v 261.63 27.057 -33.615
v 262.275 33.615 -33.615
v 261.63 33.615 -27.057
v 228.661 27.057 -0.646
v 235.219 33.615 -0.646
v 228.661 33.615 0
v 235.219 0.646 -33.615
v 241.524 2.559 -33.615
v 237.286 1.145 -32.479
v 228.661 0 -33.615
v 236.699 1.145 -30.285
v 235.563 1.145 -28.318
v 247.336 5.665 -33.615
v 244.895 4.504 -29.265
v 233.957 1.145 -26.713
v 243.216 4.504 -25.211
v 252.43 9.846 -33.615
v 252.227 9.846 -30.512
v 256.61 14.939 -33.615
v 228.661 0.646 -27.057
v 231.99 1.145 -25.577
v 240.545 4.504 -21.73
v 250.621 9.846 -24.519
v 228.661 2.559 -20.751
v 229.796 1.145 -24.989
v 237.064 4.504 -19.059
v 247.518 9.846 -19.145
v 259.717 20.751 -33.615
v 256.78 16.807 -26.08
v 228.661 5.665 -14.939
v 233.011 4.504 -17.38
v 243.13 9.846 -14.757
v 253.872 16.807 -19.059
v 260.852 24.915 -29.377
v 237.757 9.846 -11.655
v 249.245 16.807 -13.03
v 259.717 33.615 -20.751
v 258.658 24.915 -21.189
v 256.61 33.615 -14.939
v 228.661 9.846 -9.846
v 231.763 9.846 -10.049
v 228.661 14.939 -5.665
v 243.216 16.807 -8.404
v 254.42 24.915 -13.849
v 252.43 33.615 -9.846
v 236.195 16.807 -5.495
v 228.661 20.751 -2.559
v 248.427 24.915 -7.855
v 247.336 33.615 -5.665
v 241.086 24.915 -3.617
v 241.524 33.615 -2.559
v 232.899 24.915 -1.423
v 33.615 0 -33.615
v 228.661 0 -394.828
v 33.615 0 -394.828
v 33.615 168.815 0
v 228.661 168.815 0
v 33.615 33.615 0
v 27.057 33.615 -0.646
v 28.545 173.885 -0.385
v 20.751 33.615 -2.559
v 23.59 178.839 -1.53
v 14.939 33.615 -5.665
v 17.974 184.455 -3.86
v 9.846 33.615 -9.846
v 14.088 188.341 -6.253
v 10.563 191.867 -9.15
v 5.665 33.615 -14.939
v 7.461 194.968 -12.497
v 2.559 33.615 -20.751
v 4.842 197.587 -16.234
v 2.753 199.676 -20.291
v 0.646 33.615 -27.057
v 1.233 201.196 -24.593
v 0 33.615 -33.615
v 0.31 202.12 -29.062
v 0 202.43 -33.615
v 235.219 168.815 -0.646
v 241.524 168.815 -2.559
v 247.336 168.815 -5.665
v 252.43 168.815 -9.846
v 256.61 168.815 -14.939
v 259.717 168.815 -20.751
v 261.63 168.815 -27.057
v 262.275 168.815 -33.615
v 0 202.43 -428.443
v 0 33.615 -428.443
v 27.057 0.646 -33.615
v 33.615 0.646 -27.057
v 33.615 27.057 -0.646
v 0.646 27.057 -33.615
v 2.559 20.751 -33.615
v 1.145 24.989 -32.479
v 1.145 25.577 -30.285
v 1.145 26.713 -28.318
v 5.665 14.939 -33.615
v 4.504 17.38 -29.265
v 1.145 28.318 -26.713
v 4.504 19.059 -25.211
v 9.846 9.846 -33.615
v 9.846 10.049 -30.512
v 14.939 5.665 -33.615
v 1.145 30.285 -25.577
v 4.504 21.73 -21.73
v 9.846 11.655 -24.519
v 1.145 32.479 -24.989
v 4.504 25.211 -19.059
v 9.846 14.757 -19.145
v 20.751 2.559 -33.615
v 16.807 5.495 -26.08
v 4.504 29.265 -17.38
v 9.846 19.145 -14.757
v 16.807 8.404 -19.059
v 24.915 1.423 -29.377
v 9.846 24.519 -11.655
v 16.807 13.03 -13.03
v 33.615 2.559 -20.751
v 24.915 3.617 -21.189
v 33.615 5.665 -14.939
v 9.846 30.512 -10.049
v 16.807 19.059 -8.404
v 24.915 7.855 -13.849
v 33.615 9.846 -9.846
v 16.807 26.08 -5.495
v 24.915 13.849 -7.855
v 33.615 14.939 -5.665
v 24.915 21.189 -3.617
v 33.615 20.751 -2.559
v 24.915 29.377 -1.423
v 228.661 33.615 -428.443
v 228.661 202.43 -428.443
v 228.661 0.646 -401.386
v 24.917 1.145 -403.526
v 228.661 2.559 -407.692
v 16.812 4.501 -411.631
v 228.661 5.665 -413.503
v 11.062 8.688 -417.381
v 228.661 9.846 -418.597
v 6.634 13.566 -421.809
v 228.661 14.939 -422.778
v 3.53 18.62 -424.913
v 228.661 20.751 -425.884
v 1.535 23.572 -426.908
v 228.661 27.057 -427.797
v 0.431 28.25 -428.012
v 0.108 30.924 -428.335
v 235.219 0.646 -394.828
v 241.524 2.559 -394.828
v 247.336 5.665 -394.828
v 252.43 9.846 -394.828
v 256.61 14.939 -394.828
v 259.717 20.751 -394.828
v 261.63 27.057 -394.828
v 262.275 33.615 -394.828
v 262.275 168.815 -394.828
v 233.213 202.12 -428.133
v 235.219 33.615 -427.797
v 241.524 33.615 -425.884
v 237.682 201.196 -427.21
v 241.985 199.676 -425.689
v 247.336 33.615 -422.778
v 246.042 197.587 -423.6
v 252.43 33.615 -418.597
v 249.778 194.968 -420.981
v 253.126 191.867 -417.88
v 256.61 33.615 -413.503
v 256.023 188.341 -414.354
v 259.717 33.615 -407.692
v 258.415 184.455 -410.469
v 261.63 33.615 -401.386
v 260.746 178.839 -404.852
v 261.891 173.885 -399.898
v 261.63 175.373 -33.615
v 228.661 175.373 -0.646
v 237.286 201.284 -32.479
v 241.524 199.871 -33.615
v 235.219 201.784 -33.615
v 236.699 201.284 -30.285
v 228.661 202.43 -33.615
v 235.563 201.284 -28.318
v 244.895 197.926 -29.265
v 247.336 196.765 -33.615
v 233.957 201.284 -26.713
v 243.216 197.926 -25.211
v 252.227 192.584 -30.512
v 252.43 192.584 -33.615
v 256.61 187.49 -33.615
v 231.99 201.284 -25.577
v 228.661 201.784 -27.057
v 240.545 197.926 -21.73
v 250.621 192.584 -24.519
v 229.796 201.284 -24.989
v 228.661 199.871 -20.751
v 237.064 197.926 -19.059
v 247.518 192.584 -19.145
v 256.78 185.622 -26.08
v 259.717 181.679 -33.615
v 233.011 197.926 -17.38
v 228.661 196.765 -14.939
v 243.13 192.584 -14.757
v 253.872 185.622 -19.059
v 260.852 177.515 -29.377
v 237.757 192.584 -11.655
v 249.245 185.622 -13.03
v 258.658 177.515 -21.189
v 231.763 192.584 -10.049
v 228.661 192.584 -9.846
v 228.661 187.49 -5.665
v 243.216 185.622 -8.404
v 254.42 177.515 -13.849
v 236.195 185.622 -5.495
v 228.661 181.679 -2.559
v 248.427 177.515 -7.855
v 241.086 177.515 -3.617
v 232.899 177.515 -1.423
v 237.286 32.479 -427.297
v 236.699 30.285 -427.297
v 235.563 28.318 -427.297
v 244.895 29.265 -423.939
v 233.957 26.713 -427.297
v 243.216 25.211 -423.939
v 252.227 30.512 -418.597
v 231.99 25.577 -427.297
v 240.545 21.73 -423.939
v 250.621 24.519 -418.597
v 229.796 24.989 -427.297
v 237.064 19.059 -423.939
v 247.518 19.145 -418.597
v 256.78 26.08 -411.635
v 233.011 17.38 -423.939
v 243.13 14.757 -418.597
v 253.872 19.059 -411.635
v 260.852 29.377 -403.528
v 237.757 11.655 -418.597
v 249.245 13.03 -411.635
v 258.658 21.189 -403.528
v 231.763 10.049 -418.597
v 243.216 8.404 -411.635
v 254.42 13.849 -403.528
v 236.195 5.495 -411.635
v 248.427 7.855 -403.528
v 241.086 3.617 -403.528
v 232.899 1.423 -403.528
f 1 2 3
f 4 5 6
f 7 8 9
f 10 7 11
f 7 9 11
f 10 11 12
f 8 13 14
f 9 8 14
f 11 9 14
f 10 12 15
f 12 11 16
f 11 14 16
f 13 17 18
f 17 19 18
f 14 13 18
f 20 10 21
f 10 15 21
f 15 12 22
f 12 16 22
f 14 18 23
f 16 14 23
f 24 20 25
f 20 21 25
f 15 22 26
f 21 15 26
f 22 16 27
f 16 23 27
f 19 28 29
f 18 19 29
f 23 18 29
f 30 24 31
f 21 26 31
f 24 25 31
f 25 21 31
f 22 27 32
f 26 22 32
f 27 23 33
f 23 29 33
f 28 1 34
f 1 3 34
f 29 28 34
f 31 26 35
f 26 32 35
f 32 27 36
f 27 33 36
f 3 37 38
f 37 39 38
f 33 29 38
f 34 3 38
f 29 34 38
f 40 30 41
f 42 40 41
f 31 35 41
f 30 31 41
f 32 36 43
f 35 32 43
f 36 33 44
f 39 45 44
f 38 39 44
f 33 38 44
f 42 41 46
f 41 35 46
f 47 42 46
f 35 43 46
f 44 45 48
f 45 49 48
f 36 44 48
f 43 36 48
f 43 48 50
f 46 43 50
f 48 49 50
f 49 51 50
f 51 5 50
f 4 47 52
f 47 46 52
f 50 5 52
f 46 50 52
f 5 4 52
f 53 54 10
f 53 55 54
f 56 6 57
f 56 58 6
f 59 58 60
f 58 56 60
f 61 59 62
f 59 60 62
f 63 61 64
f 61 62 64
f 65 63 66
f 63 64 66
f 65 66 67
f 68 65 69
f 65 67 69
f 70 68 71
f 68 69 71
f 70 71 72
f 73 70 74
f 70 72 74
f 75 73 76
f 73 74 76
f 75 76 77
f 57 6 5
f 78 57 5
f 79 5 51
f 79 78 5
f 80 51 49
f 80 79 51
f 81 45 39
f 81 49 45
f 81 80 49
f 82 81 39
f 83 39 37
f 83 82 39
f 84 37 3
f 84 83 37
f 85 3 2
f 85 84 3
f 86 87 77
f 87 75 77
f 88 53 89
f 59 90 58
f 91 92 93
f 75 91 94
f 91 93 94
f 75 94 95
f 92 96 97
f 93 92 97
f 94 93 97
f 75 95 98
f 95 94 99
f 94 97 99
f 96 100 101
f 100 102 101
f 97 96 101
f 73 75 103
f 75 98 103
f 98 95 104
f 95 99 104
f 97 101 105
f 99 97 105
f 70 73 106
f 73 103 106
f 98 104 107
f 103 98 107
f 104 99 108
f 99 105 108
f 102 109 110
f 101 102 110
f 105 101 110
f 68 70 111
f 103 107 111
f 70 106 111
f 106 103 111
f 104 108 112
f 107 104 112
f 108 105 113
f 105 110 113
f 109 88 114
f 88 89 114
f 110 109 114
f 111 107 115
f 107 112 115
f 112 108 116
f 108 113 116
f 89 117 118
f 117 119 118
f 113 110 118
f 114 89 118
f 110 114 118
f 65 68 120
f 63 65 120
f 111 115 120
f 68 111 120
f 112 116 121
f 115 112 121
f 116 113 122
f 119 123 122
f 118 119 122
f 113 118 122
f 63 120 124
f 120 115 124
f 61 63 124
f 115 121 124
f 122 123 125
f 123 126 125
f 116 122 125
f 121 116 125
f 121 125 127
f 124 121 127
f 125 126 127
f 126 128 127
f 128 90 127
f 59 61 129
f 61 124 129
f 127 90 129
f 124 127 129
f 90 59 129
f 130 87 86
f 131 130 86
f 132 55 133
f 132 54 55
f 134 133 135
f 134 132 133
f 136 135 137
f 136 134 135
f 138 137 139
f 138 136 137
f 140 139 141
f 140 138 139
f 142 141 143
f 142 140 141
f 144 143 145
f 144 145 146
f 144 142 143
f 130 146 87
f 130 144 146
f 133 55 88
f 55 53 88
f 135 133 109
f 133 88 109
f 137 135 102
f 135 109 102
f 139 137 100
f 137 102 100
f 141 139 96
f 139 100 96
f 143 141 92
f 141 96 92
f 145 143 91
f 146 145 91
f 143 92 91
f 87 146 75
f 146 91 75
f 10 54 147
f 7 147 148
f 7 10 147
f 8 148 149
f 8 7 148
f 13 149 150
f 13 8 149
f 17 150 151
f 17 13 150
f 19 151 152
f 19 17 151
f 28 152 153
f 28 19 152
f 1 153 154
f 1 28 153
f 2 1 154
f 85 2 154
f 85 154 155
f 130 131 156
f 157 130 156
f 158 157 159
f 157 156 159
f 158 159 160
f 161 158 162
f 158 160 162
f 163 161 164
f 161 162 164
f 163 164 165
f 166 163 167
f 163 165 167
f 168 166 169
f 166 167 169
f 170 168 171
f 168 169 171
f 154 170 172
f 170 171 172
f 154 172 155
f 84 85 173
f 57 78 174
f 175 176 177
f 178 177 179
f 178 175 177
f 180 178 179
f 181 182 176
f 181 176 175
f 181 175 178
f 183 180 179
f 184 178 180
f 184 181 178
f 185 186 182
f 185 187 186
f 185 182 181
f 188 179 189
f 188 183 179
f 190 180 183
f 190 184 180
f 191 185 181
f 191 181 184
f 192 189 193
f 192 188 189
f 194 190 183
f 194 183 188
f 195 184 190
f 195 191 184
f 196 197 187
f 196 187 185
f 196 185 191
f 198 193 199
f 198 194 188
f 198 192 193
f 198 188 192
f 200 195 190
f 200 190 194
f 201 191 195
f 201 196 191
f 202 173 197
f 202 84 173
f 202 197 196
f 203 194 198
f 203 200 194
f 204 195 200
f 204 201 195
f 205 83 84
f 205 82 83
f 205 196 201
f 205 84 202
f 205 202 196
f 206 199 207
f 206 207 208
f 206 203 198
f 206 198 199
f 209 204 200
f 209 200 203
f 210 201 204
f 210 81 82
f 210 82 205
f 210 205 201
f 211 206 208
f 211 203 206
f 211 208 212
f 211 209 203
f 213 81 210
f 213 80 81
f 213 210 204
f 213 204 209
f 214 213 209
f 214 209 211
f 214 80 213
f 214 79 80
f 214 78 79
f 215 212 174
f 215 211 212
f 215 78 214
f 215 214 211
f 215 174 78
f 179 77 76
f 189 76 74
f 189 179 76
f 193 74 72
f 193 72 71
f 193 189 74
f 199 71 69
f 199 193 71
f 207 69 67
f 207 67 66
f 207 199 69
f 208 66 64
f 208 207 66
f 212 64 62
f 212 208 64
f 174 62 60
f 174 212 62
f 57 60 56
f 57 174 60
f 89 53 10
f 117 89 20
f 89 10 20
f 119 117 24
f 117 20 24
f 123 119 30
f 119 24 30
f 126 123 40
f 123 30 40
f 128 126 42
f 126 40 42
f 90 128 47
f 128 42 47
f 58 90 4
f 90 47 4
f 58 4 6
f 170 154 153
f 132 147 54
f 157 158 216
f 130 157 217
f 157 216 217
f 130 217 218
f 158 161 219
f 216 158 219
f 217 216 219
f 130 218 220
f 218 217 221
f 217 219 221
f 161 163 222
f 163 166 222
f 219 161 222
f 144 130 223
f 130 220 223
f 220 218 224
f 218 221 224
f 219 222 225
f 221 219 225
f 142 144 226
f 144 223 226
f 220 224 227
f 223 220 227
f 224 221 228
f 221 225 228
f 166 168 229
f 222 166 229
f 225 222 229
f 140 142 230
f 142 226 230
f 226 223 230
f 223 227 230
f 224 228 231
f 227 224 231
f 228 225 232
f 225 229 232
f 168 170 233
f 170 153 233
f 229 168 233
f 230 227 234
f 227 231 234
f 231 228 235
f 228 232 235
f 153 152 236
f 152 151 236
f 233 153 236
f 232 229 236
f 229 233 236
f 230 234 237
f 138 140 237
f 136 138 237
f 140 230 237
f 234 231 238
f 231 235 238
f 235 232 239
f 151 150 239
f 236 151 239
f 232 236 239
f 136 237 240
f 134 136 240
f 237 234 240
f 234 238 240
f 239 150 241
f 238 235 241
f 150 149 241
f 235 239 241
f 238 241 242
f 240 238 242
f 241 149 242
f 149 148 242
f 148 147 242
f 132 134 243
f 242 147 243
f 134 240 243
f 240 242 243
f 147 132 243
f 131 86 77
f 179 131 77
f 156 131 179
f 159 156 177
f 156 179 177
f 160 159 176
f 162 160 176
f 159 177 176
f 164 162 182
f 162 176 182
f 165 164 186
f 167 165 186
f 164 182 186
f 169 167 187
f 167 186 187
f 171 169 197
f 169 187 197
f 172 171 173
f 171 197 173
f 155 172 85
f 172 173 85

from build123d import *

# Parameters (mm, degrees)
F0_W     = 202.429667
F0_H     = 428.442776
F1_DEPTH = 262.275457
F3_R     = 33.614815


with BuildPart() as f1:
    # F0 (on Right) → F1 (new body)
    with BuildSketch(Plane.YZ):
        with Locations((101.214833, -214.221388)):
            Rectangle(F0_W, F0_H)
    extrude(amount=F1_DEPTH)

    # F3
    f3_edges = [f1.edges().sort_by_distance(p)[0] for p in [
        (262.275457, 101.214834, 0),
        (262.275457, 0, -214.221388),
        (262.275457, 101.214834, -428.442776),
        (262.275457, 202.429667, -214.221388),
        (131.137729, 0, 0),
        (131.137729, 0, -428.442776),
        (0, 0, -214.221388),
        (131.137729, 202.429667, 0),
        (0, 101.214834, 0),
    ]]
    fillet(f3_edges, radius=F3_R)


solid = f1.part
